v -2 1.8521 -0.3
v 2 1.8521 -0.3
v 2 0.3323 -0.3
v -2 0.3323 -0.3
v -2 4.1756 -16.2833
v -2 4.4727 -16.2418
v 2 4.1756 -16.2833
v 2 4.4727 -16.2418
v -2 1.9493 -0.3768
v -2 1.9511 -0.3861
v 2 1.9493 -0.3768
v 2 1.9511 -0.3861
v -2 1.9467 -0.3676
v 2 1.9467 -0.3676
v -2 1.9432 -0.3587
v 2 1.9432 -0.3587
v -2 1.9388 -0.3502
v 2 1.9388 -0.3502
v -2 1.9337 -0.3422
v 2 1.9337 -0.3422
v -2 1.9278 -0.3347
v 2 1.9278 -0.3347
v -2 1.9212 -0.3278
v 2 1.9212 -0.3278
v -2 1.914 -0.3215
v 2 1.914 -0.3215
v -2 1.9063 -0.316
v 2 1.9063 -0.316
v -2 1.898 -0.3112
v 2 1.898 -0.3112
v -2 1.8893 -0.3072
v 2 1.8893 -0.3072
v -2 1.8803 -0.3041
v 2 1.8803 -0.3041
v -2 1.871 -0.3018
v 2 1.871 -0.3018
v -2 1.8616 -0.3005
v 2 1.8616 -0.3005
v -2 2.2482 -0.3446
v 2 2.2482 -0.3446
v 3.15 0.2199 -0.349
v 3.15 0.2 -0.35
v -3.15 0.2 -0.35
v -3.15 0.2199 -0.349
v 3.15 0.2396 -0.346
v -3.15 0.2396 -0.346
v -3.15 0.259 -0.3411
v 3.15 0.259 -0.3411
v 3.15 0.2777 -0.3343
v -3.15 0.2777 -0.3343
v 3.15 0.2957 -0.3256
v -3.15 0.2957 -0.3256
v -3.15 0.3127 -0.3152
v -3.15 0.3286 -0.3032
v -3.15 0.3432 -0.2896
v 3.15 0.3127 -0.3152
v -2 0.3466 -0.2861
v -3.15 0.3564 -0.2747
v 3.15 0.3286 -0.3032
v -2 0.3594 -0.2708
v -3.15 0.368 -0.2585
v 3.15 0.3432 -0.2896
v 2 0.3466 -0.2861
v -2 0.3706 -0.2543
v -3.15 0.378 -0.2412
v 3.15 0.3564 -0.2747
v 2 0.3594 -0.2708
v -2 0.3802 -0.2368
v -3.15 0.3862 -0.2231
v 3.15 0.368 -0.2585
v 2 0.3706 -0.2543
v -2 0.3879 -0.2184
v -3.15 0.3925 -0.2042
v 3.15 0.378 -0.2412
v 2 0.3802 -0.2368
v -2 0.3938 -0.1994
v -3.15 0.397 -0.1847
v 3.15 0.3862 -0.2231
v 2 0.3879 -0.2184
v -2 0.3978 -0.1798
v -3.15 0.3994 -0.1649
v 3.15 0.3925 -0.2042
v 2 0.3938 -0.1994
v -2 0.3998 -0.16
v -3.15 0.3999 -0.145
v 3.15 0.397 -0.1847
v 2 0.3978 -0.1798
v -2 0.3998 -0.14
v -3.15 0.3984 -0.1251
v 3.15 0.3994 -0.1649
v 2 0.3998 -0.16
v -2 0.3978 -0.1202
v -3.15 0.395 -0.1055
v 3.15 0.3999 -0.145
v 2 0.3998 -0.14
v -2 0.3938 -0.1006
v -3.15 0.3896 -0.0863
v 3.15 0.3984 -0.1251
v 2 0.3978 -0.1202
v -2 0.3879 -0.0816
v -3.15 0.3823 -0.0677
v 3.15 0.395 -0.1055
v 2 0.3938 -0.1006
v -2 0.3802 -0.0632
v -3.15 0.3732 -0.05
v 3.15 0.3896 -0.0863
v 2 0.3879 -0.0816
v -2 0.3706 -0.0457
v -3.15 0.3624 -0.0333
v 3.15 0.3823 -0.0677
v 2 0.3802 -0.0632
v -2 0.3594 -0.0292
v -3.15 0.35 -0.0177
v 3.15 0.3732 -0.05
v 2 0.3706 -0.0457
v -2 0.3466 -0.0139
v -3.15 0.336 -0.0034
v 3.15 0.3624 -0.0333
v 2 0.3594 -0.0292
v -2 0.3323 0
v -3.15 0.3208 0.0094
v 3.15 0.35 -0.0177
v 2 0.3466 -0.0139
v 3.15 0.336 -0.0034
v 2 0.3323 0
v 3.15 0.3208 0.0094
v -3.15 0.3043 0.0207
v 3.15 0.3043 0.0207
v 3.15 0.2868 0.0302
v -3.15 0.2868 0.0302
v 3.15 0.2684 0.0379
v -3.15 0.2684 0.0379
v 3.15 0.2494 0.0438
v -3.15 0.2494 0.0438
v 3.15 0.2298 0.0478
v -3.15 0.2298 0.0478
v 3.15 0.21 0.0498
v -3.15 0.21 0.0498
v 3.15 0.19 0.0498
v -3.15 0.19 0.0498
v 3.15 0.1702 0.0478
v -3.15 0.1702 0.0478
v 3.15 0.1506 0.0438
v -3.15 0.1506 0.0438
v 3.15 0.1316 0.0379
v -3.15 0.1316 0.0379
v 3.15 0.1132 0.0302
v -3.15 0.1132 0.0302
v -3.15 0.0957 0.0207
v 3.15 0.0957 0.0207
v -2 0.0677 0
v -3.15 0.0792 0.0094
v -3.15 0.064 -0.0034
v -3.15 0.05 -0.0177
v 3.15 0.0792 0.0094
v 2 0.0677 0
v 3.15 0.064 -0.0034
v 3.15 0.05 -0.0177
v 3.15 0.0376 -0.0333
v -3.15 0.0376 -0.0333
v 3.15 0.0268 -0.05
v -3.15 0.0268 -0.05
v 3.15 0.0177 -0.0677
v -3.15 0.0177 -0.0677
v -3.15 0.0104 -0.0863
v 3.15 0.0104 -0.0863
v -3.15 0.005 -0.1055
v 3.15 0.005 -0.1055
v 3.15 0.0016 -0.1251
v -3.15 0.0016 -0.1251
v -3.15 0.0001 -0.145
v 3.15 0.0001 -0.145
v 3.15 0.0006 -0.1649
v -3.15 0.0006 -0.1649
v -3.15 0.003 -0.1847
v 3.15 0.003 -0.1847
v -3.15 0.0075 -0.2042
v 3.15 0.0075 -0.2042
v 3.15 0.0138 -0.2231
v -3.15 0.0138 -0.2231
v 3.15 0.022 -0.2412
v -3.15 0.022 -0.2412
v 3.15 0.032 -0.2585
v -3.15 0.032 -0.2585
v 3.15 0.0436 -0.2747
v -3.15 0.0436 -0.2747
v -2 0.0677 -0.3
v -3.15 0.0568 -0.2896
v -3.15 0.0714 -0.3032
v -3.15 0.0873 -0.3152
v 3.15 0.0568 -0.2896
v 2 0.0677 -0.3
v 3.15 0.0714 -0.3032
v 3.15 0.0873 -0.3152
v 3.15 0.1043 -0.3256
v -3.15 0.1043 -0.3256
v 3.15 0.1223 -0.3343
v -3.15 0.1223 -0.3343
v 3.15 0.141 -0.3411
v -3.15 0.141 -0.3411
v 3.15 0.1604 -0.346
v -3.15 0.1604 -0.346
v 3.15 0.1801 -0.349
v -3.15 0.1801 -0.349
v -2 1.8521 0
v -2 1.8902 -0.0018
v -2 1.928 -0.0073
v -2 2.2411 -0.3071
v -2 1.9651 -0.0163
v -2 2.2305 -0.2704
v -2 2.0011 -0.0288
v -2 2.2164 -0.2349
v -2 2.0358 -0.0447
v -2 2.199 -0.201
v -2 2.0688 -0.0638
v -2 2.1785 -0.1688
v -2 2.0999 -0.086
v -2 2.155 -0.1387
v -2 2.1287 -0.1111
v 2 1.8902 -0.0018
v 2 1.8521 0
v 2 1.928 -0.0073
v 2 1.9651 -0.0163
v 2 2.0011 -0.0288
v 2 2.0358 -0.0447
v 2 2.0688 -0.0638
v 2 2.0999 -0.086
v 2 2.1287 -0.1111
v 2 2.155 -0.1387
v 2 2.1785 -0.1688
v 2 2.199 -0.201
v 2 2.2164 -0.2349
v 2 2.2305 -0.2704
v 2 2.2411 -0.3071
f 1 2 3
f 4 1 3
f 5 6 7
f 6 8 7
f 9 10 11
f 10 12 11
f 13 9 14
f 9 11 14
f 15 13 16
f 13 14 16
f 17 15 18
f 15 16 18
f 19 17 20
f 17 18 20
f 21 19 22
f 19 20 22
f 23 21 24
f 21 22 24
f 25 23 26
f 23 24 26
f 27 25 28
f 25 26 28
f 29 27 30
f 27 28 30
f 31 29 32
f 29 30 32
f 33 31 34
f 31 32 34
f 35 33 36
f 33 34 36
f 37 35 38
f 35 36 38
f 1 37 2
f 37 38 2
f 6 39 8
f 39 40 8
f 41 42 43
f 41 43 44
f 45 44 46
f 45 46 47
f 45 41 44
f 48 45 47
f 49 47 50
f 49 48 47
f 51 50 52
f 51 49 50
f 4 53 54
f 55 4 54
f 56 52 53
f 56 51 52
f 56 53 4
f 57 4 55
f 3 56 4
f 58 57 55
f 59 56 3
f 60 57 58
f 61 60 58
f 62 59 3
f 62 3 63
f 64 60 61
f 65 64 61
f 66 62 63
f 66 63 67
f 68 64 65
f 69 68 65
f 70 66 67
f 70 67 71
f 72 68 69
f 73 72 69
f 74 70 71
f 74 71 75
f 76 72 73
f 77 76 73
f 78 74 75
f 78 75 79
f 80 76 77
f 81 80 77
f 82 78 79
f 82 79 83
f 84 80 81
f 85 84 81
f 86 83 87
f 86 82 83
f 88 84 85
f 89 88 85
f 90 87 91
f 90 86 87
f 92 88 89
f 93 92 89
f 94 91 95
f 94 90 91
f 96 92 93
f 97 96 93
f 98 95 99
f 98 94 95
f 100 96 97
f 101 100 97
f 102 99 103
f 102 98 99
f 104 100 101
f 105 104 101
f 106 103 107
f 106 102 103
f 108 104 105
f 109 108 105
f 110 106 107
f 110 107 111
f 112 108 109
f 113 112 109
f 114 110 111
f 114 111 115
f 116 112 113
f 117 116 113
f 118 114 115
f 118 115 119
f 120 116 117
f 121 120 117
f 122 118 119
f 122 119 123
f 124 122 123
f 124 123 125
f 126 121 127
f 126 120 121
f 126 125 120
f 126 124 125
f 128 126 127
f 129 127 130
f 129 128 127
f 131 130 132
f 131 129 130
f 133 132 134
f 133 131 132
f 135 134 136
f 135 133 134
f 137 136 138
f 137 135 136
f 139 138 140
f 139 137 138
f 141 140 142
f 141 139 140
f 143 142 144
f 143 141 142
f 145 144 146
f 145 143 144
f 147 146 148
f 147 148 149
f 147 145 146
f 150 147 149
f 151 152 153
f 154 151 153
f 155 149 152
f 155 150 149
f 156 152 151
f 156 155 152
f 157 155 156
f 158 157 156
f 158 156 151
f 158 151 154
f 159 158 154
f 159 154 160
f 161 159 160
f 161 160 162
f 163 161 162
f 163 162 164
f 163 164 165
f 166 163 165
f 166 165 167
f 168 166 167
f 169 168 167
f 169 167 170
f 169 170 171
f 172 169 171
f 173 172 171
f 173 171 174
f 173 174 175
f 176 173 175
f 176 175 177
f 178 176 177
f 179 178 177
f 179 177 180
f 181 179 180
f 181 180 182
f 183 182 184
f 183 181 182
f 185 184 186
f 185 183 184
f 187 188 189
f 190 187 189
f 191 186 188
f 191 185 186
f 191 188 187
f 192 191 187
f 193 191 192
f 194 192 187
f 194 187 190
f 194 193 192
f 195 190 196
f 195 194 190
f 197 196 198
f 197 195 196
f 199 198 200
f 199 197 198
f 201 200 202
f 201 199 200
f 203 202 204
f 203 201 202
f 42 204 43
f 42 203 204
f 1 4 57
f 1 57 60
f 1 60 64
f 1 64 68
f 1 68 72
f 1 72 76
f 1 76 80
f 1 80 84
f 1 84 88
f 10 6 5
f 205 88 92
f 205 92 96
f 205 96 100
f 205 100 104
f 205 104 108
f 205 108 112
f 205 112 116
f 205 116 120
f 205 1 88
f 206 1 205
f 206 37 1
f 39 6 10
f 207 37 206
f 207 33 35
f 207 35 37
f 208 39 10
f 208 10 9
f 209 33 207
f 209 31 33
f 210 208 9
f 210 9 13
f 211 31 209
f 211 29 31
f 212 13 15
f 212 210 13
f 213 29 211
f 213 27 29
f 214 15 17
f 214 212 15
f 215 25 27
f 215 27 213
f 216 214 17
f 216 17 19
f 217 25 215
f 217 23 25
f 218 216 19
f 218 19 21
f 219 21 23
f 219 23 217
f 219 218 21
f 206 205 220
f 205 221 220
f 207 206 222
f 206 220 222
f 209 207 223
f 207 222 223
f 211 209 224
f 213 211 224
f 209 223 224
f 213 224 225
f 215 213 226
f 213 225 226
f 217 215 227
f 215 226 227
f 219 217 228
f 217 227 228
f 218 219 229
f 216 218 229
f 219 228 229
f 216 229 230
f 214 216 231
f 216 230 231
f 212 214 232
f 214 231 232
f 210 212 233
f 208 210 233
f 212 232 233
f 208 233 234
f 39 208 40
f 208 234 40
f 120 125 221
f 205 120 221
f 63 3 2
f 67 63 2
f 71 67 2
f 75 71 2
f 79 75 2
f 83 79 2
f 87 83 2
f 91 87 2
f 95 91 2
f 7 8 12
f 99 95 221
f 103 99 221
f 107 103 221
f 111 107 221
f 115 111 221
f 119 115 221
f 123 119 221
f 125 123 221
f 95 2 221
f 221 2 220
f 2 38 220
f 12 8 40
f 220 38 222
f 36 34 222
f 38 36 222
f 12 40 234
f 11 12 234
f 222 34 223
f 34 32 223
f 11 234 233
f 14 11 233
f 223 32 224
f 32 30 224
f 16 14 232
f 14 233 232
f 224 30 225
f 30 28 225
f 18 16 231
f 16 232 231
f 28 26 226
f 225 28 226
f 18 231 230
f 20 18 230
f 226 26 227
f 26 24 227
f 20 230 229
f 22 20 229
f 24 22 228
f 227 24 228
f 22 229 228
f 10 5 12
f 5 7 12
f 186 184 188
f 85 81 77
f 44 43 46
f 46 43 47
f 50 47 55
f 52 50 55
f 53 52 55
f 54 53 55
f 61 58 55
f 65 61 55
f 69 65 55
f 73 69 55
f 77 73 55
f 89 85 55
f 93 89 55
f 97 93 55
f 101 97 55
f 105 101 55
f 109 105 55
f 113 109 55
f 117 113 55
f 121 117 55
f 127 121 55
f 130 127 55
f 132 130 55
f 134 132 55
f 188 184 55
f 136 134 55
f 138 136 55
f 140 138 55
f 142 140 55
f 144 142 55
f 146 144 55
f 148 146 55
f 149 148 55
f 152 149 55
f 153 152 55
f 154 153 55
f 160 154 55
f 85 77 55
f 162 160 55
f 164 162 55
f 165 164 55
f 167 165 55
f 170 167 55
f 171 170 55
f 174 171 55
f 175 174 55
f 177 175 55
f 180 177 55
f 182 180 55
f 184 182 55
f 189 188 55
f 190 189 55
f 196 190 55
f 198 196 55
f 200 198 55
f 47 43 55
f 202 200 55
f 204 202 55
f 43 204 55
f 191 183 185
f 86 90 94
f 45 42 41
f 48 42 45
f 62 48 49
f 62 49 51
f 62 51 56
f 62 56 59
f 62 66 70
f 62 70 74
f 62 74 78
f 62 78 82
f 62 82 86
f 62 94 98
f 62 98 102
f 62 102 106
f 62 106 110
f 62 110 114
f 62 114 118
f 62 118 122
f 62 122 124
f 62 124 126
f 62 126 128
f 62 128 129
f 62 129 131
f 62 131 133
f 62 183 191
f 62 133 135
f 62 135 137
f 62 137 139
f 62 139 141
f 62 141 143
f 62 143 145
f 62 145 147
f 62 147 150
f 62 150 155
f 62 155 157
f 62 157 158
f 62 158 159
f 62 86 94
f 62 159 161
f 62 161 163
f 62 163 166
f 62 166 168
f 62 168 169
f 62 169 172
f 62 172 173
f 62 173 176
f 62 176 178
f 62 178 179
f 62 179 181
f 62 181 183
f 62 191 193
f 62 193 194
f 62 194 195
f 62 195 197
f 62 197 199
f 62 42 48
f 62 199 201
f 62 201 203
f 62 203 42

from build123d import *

# Parameters (mm, degrees)
BASE_FLANGE1_DEPTH     = 2
CUT_EXTRUDE1_START     = -2
CUT_EXTRUDE1_OUTLINE_W = 0.3
CUT_EXTRUDE1_OUTLINE_H = 0.067712434
CUT_EXTRUDE1_DEPTH     = 4
SKETCH8_R              = 0.2
BOSS_EXTRUDE1_DEPTH    = 3.15


# Read off the part's stored shape, not the designer's step: Cut-Extrude1
# Sheet-metal steps are written as plain solids
with BuildPart() as part:
    # Sketch1 → Base-Flange1 (new, symmetric)
    with BuildSketch(Plane(origin=(0, 0, 0), x_dir=(0, 0, -1), z_dir=(1, 0, 0))):
        with BuildLine():
            Line((0, 0), (0, 1.852075023))
            ThreePointArc((0, 1.852075023), (0.09819474, 2.114588994), (0.344567924, 2.24821551))
            Line((0.344567924, 2.24821551), (16.24175994, 4.472715125))
            Line((16.24175994, 4.472715125), (16.283333998, 4.17560976))
            Line((16.283333998, 4.17560976), (0.386141981, 1.951110145))
            ThreePointArc((0.386141981, 1.951110145), (0.324548685, 1.917703516), (0.3, 1.852075023))
            Line((0.3, 1.852075023), (0.3, 0))
            Line((0.3, 0), (0, 0))
        make_face()
    extrude(amount=BASE_FLANGE1_DEPTH, both=True)

    # Cut-Extrude1 outline → Cut-Extrude1 (cut)
    with BuildSketch(Plane(origin=(0, 0, 0), x_dir=(0, 0, -1), z_dir=(1, 0, 0)).offset(CUT_EXTRUDE1_START)):
        with Locations((0.15, 0.033856217)):
            Rectangle(CUT_EXTRUDE1_OUTLINE_W, CUT_EXTRUDE1_OUTLINE_H)
    extrude(amount=CUT_EXTRUDE1_DEPTH, mode=Mode.SUBTRACT)

    # Sketch8 → Boss-Extrude1 (add, symmetric)
    with BuildSketch(Plane(origin=(0, 0, 0), x_dir=(0, 0, -1), z_dir=(1, 0, 0))):
        with Locations((0.15, 0.2)):
            Circle(SKETCH8_R)
    extrude(amount=BOSS_EXTRUDE1_DEPTH, both=True)


solid = part.part
